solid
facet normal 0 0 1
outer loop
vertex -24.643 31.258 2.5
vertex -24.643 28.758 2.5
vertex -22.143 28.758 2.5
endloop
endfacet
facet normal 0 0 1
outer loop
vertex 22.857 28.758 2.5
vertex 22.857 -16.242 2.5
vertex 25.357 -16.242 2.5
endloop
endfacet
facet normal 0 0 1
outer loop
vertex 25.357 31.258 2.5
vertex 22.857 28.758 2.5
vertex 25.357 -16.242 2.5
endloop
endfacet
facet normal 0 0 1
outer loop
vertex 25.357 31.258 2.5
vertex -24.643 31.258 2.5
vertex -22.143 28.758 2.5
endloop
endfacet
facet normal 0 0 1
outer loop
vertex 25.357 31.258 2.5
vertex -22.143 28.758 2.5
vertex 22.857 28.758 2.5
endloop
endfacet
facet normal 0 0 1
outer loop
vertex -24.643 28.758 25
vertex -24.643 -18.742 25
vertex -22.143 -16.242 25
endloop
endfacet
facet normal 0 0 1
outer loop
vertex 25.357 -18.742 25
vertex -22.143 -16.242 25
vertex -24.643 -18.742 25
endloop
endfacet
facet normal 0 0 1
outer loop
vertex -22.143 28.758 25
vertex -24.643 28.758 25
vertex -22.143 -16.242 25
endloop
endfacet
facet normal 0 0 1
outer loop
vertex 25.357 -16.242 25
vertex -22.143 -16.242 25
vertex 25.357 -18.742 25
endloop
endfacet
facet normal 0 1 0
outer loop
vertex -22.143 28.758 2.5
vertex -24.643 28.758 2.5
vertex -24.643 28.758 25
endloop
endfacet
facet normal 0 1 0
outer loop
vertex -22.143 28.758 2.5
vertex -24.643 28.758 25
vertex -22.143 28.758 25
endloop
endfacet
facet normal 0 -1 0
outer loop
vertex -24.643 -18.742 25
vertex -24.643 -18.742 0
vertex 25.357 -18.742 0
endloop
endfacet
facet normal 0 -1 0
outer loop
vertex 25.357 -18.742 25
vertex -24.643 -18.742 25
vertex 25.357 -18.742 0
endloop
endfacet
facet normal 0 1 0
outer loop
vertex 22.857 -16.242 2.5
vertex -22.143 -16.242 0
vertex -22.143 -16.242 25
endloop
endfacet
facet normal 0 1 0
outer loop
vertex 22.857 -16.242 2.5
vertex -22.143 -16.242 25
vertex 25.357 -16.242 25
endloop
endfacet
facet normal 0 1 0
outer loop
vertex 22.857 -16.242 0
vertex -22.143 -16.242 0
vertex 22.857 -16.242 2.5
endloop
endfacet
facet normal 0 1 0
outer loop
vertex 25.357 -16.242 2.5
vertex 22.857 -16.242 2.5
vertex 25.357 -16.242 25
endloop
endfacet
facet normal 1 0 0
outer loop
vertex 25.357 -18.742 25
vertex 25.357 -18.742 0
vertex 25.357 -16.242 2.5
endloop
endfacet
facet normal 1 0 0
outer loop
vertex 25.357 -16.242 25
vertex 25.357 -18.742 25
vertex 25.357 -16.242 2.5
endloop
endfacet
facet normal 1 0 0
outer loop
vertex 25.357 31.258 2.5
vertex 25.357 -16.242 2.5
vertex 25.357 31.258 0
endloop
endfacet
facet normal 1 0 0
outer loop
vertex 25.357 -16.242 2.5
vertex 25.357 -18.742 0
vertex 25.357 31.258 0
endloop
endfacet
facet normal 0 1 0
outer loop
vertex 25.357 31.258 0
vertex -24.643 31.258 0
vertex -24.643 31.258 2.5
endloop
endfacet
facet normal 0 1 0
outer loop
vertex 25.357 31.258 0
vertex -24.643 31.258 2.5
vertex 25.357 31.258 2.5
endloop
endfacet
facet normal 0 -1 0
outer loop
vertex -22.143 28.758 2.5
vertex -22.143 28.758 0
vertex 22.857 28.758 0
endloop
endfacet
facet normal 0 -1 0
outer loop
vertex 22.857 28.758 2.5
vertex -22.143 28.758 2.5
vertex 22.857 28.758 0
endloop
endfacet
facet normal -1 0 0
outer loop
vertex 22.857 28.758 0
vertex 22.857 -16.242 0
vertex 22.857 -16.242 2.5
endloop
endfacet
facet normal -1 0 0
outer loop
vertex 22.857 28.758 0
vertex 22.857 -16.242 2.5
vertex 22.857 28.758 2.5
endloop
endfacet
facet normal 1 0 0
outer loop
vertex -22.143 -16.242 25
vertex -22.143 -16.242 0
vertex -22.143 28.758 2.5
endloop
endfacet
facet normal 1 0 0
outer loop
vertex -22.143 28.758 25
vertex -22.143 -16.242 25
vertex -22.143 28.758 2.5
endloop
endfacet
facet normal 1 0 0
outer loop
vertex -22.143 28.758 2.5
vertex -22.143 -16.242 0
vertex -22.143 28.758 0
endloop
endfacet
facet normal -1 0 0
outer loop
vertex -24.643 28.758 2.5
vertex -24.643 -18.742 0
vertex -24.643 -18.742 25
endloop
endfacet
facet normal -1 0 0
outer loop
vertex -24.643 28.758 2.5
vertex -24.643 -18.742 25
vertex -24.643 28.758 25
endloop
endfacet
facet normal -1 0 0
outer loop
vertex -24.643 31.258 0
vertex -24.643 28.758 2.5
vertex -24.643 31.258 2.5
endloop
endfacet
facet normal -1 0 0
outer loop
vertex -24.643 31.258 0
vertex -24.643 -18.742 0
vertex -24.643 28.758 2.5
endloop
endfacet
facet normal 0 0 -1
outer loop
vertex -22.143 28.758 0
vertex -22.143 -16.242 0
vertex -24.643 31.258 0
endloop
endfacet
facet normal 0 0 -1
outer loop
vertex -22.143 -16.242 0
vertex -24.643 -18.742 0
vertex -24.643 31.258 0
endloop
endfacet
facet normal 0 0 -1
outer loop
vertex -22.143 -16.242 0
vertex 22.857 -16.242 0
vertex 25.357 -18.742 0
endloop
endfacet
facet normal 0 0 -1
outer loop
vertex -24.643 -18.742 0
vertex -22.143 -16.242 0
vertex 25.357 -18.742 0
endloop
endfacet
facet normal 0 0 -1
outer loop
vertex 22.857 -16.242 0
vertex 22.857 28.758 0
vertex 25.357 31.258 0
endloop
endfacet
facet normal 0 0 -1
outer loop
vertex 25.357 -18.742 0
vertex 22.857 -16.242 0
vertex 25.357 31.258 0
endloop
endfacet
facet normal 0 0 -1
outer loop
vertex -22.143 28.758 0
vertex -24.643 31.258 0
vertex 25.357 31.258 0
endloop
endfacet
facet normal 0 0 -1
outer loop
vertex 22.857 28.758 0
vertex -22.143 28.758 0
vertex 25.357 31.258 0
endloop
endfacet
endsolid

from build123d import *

# Parameters (mm, degrees)
F0_W     = 50
F0_H     = 50
F1_DEPTH = 25
F2_T     = -2.5
F3_T     = 2.5


# Not quite as in the source:
# - a shell that OpenCascade refuses in one call is made with other operations: the cavity is built on its own and cut out


with BuildPart() as f1:
    # F0 (on Top) → F1 (new body)
    with BuildSketch(Plane.XY):
        with Locations((0.357497856, 6.2575038522)):
            Rectangle(F0_W, F0_H)
    extrude(amount=F1_DEPTH)

    # F2
    f2_openings = [f1.faces().sort_by_distance(p)[0] for p in [
        (0.357498, 6.257504, 25),
        (0.357498, 6.257504, 0),
    ]]
    offset(amount=F2_T, openings=f2_openings)

    # F3: shell of thickness 2.5, made by hand


with BuildPart() as f3_core1:
    # F3_t2: copy of F1
    add(f1.part)

    # the walls: a layer under each face that stays
    f3_faces = [f3_core1.faces().sort_by_distance(p)[0] for p in [
        (0.357497856, -18.7424961478, 12.5),
        (-22.9758354773, -17.0758294811, 0),
        (-22.142502144, 6.2575038522, 12.5),
    ]]
    thicken(f3_faces, amount=-F3_T, mode=Mode.SUBTRACT)


with BuildPart() as f1_1:
    add(f1.part)

    # what is left inside the walls is the cavity
    f3_cavity = [f3_core1.part.solids().sort_by_distance(p)[0] for p in [
        (0.357498, 31.232504, 17.5),
    ]]
    add(f3_cavity, mode=Mode.SUBTRACT)


solid = f1_1.part
